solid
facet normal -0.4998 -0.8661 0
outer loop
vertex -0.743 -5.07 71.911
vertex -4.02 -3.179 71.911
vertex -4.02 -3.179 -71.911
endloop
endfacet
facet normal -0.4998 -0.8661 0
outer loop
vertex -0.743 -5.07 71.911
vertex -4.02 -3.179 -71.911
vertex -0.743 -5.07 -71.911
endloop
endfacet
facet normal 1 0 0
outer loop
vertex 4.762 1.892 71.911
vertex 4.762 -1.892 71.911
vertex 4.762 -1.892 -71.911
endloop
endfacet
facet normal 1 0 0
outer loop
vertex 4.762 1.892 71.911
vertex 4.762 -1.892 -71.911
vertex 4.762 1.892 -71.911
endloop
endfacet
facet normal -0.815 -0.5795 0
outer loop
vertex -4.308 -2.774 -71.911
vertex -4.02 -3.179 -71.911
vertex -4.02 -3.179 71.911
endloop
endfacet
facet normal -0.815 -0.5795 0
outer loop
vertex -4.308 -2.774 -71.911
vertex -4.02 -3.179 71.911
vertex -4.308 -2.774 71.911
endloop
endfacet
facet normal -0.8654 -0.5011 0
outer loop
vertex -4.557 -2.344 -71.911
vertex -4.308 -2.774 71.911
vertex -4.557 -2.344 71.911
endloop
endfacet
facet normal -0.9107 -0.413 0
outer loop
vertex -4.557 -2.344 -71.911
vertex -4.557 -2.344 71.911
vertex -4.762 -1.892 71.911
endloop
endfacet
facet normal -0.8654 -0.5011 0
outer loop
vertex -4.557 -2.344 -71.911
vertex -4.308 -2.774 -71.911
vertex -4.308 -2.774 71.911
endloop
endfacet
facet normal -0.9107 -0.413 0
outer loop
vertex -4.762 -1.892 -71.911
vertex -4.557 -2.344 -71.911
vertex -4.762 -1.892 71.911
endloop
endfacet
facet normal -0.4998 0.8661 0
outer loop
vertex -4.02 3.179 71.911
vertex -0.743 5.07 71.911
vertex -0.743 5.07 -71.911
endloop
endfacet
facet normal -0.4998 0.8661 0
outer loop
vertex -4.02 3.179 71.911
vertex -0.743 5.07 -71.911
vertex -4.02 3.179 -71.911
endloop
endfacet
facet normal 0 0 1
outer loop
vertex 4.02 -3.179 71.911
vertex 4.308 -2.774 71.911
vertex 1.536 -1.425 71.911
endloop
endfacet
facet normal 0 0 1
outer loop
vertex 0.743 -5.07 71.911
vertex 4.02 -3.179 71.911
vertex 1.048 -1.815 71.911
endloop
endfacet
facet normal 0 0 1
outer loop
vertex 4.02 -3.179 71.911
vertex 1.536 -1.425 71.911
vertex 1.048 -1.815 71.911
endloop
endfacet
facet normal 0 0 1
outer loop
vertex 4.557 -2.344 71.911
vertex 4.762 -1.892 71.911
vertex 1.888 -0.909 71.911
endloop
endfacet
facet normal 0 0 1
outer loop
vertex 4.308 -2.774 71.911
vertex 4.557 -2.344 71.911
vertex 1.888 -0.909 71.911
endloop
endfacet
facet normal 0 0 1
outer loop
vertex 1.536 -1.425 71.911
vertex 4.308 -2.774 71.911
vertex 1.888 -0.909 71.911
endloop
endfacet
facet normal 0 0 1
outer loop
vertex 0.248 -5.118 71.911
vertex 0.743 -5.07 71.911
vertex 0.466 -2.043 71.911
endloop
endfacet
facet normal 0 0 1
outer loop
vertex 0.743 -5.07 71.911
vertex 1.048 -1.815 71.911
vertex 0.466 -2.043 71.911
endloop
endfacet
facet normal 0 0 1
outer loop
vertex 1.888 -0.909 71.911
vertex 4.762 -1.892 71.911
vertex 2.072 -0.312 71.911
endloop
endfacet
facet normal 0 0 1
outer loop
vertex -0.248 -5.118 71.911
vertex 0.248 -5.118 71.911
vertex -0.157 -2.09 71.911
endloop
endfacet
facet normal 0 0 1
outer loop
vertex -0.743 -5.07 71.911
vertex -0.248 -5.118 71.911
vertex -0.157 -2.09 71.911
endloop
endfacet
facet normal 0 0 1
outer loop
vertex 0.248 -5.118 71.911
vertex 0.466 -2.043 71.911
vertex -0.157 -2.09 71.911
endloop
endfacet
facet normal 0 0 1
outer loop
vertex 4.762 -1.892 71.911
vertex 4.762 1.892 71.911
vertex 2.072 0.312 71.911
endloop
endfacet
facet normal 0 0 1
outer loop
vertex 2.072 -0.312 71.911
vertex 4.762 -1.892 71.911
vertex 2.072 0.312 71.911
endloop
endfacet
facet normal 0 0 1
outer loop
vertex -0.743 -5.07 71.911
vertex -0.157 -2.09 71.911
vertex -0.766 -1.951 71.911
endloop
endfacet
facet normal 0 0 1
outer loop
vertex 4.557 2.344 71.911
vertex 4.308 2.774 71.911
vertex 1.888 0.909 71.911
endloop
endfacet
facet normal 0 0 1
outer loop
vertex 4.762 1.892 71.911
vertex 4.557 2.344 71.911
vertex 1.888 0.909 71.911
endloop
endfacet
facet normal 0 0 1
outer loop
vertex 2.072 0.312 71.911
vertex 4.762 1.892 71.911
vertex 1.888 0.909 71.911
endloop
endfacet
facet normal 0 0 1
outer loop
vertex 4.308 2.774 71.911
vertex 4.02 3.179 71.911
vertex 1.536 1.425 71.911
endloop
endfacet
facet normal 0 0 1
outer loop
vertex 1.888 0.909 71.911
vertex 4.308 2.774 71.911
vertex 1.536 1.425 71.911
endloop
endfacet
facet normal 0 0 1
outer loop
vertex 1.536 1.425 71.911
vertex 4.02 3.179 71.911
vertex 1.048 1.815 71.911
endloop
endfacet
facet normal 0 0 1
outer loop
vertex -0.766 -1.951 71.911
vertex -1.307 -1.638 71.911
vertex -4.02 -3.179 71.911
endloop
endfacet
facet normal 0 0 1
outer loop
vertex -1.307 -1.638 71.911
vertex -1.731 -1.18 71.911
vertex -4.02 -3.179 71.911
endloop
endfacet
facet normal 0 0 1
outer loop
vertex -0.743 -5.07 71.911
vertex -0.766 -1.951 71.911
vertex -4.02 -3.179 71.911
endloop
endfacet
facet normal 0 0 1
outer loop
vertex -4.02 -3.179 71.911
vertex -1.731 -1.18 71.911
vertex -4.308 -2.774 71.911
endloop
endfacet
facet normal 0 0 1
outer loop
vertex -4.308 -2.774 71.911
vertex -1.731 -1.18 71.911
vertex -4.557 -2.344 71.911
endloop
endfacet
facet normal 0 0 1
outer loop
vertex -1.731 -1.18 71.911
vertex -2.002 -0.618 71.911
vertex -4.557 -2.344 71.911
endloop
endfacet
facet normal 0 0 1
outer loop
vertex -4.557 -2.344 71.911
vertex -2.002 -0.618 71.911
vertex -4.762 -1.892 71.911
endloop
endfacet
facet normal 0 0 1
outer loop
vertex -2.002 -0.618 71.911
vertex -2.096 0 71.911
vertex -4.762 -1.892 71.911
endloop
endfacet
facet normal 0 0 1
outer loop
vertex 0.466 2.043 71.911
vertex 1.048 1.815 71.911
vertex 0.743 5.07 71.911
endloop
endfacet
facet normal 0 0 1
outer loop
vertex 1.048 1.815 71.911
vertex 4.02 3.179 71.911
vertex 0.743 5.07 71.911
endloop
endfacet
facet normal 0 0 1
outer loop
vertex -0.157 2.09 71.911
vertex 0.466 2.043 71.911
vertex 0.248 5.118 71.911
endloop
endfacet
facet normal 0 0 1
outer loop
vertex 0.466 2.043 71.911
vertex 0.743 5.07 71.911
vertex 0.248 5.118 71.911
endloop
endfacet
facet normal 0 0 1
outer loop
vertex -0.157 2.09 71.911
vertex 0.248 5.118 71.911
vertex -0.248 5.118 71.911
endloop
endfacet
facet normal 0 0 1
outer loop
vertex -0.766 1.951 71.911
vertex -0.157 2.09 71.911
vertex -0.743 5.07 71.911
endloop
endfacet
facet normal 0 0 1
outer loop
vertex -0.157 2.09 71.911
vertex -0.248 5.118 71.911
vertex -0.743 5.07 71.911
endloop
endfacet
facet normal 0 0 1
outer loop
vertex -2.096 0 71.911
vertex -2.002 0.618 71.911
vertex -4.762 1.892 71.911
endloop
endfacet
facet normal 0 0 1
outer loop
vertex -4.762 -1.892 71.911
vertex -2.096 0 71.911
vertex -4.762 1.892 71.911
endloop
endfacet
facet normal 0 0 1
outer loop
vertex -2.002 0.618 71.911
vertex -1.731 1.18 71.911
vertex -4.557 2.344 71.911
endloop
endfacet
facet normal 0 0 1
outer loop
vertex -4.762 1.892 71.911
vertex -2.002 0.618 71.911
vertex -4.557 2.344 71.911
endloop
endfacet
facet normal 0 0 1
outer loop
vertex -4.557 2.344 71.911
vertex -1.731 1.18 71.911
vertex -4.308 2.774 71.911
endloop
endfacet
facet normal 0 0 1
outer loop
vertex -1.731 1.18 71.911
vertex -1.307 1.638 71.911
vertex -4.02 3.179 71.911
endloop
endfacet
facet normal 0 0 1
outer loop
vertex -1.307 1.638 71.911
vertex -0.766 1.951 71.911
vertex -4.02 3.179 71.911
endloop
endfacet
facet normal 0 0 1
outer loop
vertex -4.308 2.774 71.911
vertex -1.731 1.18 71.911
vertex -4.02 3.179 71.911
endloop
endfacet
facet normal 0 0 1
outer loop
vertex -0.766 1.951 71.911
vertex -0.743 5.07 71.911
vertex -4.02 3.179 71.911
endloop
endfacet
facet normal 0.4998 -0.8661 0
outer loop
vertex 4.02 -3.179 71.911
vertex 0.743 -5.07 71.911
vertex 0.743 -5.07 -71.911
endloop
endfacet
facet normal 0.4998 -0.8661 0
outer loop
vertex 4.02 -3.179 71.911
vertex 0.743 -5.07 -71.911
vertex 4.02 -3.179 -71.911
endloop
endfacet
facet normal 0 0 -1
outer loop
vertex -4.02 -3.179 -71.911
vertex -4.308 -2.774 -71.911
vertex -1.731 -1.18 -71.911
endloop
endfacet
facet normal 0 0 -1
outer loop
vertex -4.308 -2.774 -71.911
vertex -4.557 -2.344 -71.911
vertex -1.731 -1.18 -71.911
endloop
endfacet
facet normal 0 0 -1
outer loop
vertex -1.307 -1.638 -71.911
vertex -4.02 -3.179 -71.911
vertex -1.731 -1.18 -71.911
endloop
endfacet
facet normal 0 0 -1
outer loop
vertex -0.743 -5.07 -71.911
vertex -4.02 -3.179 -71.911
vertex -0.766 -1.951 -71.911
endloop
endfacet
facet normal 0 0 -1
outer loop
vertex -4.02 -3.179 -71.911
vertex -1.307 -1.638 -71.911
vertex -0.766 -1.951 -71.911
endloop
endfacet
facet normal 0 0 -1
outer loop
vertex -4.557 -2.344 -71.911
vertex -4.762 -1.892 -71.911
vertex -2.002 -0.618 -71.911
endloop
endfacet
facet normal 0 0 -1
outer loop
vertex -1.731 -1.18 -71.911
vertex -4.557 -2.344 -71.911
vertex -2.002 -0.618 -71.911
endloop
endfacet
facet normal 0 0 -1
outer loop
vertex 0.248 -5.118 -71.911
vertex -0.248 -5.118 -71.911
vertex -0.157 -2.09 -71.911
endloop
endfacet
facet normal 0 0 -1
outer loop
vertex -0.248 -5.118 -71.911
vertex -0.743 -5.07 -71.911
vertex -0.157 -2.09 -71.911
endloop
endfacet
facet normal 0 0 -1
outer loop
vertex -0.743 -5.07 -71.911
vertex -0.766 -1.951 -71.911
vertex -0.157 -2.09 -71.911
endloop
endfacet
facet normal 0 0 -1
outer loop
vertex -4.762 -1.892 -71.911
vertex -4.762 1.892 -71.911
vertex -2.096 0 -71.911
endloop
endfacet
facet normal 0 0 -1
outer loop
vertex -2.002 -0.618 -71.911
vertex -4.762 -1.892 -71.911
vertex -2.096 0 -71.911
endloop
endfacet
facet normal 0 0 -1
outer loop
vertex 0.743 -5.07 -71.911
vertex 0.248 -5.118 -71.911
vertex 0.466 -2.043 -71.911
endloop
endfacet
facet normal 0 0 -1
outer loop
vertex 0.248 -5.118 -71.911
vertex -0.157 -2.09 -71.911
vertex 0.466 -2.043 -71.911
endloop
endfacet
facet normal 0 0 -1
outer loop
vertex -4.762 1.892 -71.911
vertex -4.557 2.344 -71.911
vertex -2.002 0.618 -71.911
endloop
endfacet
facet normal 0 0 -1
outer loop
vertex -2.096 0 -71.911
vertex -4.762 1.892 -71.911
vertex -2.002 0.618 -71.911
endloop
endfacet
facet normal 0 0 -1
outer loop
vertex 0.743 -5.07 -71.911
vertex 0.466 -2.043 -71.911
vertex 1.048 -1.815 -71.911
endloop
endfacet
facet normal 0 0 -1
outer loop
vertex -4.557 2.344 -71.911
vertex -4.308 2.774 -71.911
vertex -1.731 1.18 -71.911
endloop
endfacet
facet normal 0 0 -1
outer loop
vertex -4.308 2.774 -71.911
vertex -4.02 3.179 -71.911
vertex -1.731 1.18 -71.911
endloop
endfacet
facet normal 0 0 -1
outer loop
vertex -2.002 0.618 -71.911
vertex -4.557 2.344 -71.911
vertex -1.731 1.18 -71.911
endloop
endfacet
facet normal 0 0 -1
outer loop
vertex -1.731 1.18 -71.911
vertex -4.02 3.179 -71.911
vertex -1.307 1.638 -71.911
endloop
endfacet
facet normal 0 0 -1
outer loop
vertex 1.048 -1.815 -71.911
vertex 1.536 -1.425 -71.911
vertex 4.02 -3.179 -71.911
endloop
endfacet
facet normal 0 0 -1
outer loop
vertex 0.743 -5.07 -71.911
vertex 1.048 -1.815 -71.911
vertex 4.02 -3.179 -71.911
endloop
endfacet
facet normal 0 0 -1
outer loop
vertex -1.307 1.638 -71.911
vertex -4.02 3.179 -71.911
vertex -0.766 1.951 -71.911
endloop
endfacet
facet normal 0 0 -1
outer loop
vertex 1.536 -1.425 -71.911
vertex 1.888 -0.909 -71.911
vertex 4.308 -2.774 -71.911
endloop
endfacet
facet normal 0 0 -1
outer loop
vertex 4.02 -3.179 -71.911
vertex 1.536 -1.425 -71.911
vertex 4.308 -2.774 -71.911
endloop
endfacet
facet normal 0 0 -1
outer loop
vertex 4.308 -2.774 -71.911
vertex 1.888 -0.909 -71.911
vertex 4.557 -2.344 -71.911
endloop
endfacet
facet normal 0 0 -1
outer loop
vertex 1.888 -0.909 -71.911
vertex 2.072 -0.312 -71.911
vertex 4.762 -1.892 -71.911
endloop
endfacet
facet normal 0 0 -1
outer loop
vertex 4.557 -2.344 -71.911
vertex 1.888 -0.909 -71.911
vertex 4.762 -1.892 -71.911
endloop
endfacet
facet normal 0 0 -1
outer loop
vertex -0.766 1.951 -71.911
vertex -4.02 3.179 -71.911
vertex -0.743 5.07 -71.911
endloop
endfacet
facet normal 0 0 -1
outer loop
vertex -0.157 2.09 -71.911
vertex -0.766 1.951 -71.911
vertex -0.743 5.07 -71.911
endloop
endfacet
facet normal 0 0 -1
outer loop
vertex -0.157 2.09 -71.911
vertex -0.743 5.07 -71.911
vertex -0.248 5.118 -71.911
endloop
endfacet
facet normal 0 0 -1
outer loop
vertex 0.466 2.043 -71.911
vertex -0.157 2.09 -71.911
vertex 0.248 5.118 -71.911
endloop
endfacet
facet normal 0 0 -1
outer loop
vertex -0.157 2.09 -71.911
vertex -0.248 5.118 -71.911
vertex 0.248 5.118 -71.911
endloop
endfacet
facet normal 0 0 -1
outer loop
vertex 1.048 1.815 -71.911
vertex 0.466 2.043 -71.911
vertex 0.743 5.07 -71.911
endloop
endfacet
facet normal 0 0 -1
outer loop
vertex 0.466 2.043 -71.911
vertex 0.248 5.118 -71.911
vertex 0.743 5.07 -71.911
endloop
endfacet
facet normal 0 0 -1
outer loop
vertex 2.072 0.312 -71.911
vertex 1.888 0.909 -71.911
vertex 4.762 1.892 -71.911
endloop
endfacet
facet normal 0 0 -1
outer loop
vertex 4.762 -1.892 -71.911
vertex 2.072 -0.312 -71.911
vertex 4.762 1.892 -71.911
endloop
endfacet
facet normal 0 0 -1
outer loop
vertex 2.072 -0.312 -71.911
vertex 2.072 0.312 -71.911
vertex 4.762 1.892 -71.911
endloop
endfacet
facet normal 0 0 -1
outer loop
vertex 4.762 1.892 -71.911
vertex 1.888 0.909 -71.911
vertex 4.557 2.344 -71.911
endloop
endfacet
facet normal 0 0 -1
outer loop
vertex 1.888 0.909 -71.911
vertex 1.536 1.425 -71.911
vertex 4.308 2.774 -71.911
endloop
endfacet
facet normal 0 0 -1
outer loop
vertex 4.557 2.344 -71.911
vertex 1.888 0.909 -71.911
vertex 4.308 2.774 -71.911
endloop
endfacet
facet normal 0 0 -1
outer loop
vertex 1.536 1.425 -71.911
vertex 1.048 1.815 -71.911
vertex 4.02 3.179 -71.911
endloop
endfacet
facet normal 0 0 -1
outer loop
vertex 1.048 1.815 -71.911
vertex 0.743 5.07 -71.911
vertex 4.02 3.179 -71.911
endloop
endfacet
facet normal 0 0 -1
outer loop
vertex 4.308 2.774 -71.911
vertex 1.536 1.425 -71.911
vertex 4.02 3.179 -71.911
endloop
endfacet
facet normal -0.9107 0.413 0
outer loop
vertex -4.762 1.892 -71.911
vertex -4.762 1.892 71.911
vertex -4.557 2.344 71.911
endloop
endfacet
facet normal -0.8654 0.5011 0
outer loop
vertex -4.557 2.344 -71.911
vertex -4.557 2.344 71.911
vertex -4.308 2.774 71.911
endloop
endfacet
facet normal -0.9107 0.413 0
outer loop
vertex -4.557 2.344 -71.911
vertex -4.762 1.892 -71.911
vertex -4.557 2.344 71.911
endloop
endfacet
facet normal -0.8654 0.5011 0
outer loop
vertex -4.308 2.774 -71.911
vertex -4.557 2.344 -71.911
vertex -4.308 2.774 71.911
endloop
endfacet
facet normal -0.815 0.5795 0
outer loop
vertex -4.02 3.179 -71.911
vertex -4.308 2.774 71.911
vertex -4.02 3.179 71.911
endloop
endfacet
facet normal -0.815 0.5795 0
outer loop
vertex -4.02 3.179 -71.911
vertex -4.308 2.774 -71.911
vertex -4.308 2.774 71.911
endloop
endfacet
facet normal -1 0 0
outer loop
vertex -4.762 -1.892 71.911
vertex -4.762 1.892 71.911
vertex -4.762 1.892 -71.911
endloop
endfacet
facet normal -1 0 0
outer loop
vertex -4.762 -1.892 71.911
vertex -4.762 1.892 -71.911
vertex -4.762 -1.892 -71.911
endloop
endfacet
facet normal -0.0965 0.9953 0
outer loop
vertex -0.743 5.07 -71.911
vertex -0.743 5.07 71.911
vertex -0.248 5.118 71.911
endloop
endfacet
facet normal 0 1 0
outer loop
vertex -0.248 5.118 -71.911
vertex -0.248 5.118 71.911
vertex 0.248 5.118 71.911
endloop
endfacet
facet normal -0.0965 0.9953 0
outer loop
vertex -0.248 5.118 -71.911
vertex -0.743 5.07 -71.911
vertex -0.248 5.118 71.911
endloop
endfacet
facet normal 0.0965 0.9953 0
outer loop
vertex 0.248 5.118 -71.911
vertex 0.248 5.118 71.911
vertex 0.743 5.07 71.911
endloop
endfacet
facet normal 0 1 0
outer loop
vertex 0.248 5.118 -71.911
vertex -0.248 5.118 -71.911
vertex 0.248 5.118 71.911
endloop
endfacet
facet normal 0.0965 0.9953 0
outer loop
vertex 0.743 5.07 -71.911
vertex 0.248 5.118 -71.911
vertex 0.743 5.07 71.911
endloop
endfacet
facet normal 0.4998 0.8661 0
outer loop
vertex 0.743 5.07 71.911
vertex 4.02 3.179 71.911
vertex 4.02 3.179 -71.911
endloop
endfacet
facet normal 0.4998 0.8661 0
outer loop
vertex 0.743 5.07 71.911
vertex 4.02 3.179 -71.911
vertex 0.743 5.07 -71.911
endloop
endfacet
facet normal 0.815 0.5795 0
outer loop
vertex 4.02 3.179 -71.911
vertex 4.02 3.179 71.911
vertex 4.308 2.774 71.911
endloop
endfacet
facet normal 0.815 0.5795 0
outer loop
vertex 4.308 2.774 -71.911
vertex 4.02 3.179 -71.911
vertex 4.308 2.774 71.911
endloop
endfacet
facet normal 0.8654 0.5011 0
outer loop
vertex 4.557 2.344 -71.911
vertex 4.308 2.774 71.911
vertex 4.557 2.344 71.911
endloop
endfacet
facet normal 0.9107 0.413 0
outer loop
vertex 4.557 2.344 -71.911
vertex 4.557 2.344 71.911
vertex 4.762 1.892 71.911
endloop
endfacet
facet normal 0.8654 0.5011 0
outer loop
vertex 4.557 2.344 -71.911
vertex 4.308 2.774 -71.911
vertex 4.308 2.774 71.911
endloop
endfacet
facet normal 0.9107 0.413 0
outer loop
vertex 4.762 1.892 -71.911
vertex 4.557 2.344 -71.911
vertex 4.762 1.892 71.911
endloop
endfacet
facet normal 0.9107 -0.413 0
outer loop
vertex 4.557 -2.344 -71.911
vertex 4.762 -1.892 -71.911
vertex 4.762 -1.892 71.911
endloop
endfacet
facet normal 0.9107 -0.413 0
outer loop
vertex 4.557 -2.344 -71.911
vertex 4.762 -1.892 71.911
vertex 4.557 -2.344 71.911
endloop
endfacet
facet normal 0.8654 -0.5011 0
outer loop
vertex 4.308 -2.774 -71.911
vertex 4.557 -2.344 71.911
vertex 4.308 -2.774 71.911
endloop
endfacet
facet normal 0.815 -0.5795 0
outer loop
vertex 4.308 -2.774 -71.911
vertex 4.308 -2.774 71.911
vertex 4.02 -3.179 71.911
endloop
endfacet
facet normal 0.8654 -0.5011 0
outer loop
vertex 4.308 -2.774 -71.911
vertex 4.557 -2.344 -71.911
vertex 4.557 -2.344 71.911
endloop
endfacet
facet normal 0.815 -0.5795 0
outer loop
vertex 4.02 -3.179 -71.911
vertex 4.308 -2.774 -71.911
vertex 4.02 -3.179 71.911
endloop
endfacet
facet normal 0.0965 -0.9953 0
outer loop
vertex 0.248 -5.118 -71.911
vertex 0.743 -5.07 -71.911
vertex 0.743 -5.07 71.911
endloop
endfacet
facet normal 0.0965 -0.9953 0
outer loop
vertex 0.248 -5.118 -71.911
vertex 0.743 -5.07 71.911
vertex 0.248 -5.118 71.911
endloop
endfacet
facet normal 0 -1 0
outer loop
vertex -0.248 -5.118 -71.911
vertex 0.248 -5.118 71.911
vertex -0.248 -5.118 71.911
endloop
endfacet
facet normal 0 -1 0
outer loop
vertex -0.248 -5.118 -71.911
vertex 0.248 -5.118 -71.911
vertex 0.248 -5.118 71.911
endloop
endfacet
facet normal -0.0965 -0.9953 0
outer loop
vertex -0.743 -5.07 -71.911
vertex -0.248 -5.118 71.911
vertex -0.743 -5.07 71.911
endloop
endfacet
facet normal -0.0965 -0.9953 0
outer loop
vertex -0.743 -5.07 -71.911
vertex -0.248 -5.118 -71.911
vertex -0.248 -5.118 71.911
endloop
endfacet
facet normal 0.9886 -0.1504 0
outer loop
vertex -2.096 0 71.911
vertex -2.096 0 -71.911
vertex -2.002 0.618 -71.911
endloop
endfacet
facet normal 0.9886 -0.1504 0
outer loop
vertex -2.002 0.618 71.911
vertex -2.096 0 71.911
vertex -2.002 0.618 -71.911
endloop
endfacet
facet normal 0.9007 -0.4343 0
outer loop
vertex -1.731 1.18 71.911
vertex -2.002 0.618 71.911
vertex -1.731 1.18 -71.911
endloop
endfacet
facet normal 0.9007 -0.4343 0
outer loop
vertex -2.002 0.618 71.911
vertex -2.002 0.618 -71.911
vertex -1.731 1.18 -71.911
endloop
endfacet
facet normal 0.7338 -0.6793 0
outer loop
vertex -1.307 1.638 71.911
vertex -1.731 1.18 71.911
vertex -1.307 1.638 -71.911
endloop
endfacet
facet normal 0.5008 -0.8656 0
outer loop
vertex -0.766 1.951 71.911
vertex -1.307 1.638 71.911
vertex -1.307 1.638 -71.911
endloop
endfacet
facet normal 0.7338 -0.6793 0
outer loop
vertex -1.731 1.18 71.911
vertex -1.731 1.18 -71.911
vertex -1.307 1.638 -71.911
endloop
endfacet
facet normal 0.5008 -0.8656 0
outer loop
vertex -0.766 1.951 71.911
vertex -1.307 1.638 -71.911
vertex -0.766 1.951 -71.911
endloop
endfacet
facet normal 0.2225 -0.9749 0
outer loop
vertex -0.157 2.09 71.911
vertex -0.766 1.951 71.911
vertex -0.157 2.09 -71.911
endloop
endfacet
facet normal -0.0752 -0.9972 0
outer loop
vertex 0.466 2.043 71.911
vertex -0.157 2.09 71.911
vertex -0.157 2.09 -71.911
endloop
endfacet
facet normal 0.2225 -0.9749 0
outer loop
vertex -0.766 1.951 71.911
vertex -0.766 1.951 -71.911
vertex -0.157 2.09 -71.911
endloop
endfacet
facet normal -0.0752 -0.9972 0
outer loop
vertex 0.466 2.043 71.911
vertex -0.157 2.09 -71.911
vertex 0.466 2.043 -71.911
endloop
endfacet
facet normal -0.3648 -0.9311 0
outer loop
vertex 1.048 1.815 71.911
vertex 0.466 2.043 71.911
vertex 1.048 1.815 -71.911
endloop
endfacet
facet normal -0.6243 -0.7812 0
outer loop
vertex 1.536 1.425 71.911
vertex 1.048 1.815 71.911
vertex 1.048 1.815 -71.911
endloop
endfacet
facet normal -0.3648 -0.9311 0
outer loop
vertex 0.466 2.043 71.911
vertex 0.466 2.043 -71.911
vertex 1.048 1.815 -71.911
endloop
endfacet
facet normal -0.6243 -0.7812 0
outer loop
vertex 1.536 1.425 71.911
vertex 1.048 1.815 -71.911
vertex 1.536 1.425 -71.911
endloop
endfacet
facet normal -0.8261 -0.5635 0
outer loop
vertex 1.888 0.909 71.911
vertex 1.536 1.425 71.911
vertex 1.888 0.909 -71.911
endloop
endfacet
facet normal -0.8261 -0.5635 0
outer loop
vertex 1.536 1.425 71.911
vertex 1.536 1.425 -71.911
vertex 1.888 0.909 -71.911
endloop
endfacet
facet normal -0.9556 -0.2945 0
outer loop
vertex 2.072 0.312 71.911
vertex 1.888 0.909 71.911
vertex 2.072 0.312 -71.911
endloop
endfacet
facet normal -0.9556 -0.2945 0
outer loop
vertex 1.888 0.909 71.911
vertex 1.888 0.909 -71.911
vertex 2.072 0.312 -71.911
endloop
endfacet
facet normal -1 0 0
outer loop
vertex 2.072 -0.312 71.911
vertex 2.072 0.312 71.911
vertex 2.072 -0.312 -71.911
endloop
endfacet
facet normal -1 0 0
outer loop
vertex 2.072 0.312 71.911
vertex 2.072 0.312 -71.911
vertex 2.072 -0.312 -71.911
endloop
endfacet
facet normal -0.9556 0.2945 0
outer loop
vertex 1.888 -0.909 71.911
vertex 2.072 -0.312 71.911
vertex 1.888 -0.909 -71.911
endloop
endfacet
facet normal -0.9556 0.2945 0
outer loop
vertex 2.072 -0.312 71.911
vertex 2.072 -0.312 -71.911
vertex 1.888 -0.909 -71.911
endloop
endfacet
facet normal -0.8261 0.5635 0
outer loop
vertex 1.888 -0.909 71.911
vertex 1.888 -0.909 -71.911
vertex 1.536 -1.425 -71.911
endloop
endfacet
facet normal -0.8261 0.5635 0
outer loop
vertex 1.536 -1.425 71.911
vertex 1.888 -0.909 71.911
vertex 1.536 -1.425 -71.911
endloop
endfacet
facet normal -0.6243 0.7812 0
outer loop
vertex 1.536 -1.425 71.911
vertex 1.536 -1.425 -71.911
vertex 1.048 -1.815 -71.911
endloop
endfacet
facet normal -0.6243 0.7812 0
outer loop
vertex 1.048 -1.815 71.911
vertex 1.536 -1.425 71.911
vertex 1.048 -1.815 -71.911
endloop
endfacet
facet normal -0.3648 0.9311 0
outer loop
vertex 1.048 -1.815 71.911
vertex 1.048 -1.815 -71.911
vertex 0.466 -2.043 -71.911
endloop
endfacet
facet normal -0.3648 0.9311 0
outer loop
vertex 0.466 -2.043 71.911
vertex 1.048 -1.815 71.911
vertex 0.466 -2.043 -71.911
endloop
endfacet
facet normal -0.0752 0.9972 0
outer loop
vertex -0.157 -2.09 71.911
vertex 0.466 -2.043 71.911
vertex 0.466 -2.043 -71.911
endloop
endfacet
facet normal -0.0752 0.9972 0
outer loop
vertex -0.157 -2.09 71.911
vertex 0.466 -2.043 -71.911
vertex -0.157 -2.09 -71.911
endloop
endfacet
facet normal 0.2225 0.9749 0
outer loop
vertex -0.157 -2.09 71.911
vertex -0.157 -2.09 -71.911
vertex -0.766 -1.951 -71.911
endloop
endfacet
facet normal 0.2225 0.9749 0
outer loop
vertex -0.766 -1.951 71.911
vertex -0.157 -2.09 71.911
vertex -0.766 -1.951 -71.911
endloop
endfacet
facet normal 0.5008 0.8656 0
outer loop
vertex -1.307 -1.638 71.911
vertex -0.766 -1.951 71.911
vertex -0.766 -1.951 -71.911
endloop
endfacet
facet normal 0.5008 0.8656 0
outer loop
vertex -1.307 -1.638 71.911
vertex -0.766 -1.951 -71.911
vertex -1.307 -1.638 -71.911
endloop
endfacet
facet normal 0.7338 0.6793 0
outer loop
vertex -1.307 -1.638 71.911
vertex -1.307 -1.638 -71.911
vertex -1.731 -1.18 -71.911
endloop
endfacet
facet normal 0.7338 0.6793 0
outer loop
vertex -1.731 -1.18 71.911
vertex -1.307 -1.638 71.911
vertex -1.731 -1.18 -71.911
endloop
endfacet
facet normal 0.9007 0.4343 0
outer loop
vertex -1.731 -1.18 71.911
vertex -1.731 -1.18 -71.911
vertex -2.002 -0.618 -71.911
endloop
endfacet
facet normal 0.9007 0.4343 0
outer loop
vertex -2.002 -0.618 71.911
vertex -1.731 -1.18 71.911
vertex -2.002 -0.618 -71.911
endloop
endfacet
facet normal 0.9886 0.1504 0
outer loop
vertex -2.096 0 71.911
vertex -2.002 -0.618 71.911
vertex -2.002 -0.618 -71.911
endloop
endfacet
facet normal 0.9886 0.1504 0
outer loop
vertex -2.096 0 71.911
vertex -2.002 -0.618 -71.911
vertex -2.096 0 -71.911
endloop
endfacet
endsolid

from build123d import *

# Parameters (mm, degrees)
SHAFT_BOSS_DEPTH                = 457.2
SKETCH2_R                       = 7.66445
SKETCH2_R_2                     = 5.12445
CUT_FOR_THUNDER_HEX_ROUND_DEPTH = 914.4
SKETCH3_R                       = 2.0955
CENTER_HOLE_CUT_DEPTH           = 914.4


with BuildPart() as part:
    # Sketch1 → Shaft Boss (new, symmetric)
    with BuildSketch(Plane.XY):
        Polygon((0, 5.499261314), (-4.7625, 2.749630657), (-4.7625, -2.749630657), (0, -5.499261314), (4.7625, -2.749630657), (4.7625, 2.749630657), align=None)
    extrude(amount=SHAFT_BOSS_DEPTH, both=True)

    # Sketch2 → Cut For Thunder Hex Round (cut)
    with BuildSketch(Plane(origin=(0, 0, -457.2), x_dir=(-1, 0, 0), z_dir=(0, 0, -1))):
        Circle(SKETCH2_R)
        Circle(SKETCH2_R_2, mode=Mode.SUBTRACT)
    extrude(amount=-CUT_FOR_THUNDER_HEX_ROUND_DEPTH, mode=Mode.SUBTRACT)

    # Sketch3 → Center Hole Cut (cut)
    with BuildSketch(Plane(origin=(0, 0, -457.2), x_dir=(-1, 0, 0), z_dir=(0, 0, -1))):
        Circle(SKETCH3_R)
    extrude(amount=-CENTER_HOLE_CUT_DEPTH, mode=Mode.SUBTRACT)

    # SurfaceCut1
    split(bisect_by=Plane(origin=(0, 0, 71.9105), x_dir=(-1, 0, 0), z_dir=(0, 0, -1)), keep=Keep.TOP)

    # SurfaceCut2
    split(bisect_by=Plane.XY.offset(-71.9105), keep=Keep.TOP)


solid = part.part
